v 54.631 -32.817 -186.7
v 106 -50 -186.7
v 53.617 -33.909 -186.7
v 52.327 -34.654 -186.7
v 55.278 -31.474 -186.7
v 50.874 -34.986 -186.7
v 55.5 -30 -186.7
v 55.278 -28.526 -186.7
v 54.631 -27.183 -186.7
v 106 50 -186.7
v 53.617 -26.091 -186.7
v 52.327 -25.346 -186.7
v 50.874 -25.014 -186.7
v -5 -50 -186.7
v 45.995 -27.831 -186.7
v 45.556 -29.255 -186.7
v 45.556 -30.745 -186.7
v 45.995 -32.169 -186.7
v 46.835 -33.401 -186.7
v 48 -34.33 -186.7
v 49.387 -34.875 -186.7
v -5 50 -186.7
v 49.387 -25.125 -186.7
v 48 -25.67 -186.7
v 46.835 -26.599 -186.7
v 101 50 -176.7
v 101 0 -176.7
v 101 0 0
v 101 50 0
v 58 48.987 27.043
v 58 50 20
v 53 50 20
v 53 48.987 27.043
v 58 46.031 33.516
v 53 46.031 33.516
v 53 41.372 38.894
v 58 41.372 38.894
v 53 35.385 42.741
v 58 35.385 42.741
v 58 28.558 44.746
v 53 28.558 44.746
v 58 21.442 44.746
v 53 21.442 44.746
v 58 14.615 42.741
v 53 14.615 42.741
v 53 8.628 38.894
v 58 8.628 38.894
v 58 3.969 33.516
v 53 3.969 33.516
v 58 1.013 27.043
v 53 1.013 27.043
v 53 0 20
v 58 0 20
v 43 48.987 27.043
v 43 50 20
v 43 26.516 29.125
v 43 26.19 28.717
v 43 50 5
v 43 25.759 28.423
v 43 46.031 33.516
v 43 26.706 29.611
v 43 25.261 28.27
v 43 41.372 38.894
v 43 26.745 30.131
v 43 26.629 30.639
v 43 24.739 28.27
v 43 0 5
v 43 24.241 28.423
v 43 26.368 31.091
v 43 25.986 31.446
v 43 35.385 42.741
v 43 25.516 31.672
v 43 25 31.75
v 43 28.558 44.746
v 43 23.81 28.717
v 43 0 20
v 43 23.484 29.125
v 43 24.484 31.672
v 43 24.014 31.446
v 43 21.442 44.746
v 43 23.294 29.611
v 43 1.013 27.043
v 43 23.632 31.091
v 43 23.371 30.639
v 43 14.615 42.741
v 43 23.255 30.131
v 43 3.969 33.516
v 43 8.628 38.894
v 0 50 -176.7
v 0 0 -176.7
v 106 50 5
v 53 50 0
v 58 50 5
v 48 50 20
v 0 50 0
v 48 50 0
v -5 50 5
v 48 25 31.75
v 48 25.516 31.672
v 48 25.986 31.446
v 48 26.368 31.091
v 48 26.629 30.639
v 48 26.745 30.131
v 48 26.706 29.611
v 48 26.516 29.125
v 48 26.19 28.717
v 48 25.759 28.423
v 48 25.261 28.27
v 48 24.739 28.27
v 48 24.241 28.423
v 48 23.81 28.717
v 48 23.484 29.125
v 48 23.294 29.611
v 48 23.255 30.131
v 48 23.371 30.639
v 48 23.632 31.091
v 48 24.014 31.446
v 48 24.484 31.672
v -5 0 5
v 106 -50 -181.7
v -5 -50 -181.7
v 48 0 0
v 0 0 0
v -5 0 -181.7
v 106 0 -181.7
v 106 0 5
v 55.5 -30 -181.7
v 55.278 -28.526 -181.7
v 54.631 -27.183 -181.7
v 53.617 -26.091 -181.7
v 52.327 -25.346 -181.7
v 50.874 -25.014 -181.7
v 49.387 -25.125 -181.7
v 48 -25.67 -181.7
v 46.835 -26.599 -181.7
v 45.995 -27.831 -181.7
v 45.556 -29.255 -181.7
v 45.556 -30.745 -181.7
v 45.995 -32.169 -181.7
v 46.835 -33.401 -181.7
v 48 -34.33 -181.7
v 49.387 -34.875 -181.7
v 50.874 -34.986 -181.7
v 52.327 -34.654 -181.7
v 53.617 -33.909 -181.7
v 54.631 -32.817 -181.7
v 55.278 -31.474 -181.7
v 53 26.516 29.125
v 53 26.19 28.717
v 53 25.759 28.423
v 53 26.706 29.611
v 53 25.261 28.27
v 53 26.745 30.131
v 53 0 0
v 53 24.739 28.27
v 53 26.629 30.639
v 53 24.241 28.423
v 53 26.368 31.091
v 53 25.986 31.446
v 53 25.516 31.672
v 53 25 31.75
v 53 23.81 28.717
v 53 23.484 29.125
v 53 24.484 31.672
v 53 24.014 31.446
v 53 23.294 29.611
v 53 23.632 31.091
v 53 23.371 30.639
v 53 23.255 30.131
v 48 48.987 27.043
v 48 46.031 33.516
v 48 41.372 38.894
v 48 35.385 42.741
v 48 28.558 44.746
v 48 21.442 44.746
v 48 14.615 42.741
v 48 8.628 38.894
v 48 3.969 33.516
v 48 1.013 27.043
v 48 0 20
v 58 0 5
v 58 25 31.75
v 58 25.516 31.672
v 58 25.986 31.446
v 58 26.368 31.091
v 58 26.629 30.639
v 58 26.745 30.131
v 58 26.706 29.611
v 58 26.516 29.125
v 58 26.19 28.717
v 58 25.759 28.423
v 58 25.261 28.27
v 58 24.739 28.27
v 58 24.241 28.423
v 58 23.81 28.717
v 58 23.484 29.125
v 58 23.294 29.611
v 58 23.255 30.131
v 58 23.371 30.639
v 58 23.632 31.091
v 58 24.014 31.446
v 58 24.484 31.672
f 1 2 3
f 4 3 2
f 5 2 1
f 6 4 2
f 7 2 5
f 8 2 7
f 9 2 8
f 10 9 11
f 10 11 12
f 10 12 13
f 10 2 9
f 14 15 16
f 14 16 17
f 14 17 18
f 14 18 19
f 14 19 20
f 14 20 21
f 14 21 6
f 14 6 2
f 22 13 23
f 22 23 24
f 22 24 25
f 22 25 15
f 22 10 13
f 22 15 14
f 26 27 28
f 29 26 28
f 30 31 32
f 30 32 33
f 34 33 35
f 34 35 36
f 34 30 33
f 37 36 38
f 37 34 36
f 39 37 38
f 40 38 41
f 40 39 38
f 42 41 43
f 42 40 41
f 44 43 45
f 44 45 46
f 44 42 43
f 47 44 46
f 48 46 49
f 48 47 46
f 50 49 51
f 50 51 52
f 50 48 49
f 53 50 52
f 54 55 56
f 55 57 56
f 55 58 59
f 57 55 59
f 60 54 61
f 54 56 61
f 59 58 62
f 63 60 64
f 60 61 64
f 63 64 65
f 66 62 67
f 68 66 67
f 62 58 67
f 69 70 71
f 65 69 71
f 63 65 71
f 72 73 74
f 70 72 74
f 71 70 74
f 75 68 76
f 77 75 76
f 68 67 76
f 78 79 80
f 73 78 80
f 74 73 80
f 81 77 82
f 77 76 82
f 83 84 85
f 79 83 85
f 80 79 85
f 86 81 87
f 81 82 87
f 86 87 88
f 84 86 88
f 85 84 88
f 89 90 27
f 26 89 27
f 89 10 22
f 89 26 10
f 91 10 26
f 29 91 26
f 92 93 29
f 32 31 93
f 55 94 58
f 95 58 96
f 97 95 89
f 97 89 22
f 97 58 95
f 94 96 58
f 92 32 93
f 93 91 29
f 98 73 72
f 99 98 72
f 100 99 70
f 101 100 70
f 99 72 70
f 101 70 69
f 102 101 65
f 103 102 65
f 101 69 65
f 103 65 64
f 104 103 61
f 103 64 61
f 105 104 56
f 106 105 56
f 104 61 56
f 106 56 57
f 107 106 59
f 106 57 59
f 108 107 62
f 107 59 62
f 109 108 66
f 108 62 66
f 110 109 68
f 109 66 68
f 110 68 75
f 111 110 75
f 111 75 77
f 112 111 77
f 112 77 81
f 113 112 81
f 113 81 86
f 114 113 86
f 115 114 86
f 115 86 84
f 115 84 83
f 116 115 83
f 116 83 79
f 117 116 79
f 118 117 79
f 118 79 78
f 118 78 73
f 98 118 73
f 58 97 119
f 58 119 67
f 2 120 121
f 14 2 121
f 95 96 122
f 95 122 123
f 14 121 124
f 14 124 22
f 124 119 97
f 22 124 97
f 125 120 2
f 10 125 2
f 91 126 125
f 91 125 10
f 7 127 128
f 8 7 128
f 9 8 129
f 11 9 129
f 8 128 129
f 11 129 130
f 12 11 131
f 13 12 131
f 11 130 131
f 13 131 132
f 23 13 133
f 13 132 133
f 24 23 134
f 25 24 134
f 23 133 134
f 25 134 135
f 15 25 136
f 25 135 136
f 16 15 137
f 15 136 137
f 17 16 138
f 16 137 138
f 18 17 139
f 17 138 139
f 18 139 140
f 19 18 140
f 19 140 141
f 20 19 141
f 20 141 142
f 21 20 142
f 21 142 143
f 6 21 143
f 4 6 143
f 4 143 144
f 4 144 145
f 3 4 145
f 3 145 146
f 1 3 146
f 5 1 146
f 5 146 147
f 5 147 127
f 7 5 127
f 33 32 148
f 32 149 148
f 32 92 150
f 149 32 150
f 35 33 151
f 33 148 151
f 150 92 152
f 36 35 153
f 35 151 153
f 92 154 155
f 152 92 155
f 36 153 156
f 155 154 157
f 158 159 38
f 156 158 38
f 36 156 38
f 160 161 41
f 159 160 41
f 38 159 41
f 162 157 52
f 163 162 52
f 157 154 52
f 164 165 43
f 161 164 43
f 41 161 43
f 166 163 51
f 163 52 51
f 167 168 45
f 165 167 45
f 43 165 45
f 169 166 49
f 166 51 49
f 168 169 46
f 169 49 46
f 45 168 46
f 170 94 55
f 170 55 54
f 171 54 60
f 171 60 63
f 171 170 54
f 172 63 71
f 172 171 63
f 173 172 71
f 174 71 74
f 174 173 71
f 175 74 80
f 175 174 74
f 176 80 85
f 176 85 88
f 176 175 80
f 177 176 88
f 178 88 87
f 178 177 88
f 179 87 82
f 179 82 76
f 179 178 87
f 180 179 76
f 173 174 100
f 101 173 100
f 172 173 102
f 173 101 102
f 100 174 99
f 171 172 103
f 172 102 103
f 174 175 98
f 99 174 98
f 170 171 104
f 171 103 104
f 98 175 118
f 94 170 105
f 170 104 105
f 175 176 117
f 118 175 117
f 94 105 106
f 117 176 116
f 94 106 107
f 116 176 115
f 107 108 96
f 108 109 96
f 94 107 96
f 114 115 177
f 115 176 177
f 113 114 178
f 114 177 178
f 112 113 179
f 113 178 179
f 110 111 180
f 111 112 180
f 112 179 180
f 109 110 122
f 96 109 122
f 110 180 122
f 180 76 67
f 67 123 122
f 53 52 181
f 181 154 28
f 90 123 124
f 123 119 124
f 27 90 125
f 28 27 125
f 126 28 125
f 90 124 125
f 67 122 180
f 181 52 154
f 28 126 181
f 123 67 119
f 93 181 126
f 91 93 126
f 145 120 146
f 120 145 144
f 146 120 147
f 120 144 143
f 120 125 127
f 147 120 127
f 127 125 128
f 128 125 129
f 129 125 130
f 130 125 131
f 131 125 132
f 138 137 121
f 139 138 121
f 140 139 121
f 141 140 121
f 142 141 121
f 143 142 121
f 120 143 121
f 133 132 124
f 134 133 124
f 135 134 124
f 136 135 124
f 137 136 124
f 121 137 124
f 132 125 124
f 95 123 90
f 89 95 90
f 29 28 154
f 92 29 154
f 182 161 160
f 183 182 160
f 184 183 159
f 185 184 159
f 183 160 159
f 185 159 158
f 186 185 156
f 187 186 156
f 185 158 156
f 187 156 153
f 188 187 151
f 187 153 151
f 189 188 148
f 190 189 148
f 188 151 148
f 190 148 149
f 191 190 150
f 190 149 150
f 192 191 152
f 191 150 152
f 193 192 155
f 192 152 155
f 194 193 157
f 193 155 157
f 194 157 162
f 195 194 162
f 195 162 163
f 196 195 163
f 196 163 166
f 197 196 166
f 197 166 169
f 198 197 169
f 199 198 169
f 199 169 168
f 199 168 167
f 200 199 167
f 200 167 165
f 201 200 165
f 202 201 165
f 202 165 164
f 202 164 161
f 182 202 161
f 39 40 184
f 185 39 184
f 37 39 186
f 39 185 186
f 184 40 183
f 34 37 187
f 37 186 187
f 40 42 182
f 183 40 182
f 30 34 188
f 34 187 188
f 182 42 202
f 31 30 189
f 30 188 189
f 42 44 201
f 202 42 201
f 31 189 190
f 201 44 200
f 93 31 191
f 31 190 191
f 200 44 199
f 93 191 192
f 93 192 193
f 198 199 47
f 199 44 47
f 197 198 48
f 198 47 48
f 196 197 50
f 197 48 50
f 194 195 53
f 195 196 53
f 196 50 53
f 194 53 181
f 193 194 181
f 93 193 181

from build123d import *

# Parameters (mm, degrees)
BOSS_EXTRUDE1_DEPTH = 50
FILLET1_RADIUS      = 25
FILLET1_LENGTH      = 5
FILLET2_RADIUS      = 25
FILLET2_LENGTH      = 5
SKETCH2_W           = 111
SKETCH2_H           = 100
BOSS_EXTRUDE2_DEPTH = 5
SKETCH3_R           = 1.75
CUT_EXTRUDE1_DEPTH  = 204.28770253
SKETCH4_R           = 5
CUT_EXTRUDE2_DEPTH  = 256.203624582


with BuildPart() as part:
    # Sketch1 → Boss-Extrude1 (new body)
    with BuildSketch(Plane(origin=(0, 0, 0), x_dir=(1, 0, 0), z_dir=(0, 1, 0))):
        Polygon((0, 0), (0, 176.7), (101, 176.7), (101, 0), (53, 0), (53, -5), (53, -45), (58, -45), (58, -5), (106, -5), (106, 181.7), (-5, 181.7), (-5, -5), (43, -5), (43, -45), (48, -45), (48, -5), (48, 0), align=None)
    extrude(amount=BOSS_EXTRUDE1_DEPTH)

    # Fillet1: full round fillet: the end face becomes a half cylinder, R = half its width
    fillet1_face = Plane((45.5, 25, 45), x_dir=(1, 0, 0), z_dir=(0, 0, 1))  # on the end face: x along it, z out of the body
    fillet1_slab = fillet1_face.offset(-FILLET1_RADIUS / 2) * Box(FILLET1_LENGTH, 2 * FILLET1_RADIUS, FILLET1_RADIUS, mode=Mode.PRIVATE)  # the body's end, R deep
    fillet1_round = Plane((45.5, 25, 20), x_dir=(0, 0, 1), z_dir=(1, 0, 0)) * Cylinder(FILLET1_RADIUS, FILLET1_LENGTH, mode=Mode.PRIVATE)  # its axis R under the face
    add(fillet1_slab - fillet1_round, mode=Mode.SUBTRACT)

    # Fillet2: full round fillet: the end face becomes a half cylinder, R = half its width
    fillet2_face = Plane((55.5, 25, 45), x_dir=(1, 0, 0), z_dir=(0, 0, 1))  # on the end face: x along it, z out of the body
    fillet2_slab = fillet2_face.offset(-FILLET2_RADIUS / 2) * Box(FILLET2_LENGTH, 2 * FILLET2_RADIUS, FILLET2_RADIUS, mode=Mode.PRIVATE)  # the body's end, R deep
    fillet2_round = Plane((55.5, 25, 20), x_dir=(0, 0, 1), z_dir=(1, 0, 0)) * Cylinder(FILLET2_RADIUS, FILLET2_LENGTH, mode=Mode.PRIVATE)  # its axis R under the face
    add(fillet2_slab - fillet2_round, mode=Mode.SUBTRACT)

    # Sketch2 → Boss-Extrude2 (add)
    with BuildSketch(Plane(origin=(0, 0, -181.7), x_dir=(-1, 0, 0), z_dir=(0, 0, -1))):
        with Locations((-50.5, 0)):
            Rectangle(SKETCH2_W, SKETCH2_H)
    extrude(amount=BOSS_EXTRUDE2_DEPTH)

    # Sketch3 → Cut-Extrude1 (cut, through all)
    with BuildSketch(Plane.ZY.offset(-43)):
        with Locations((30, 25)):
            Circle(SKETCH3_R)
    extrude(amount=-CUT_EXTRUDE1_DEPTH, mode=Mode.SUBTRACT)

    # Sketch4 → Cut-Extrude2 (cut, through all)
    with BuildSketch(Plane.XY.offset(-181.7)):
        with Locations((50.5, -30)):
            Circle(SKETCH4_R)
    extrude(amount=-CUT_EXTRUDE2_DEPTH, mode=Mode.SUBTRACT)


solid = part.part
